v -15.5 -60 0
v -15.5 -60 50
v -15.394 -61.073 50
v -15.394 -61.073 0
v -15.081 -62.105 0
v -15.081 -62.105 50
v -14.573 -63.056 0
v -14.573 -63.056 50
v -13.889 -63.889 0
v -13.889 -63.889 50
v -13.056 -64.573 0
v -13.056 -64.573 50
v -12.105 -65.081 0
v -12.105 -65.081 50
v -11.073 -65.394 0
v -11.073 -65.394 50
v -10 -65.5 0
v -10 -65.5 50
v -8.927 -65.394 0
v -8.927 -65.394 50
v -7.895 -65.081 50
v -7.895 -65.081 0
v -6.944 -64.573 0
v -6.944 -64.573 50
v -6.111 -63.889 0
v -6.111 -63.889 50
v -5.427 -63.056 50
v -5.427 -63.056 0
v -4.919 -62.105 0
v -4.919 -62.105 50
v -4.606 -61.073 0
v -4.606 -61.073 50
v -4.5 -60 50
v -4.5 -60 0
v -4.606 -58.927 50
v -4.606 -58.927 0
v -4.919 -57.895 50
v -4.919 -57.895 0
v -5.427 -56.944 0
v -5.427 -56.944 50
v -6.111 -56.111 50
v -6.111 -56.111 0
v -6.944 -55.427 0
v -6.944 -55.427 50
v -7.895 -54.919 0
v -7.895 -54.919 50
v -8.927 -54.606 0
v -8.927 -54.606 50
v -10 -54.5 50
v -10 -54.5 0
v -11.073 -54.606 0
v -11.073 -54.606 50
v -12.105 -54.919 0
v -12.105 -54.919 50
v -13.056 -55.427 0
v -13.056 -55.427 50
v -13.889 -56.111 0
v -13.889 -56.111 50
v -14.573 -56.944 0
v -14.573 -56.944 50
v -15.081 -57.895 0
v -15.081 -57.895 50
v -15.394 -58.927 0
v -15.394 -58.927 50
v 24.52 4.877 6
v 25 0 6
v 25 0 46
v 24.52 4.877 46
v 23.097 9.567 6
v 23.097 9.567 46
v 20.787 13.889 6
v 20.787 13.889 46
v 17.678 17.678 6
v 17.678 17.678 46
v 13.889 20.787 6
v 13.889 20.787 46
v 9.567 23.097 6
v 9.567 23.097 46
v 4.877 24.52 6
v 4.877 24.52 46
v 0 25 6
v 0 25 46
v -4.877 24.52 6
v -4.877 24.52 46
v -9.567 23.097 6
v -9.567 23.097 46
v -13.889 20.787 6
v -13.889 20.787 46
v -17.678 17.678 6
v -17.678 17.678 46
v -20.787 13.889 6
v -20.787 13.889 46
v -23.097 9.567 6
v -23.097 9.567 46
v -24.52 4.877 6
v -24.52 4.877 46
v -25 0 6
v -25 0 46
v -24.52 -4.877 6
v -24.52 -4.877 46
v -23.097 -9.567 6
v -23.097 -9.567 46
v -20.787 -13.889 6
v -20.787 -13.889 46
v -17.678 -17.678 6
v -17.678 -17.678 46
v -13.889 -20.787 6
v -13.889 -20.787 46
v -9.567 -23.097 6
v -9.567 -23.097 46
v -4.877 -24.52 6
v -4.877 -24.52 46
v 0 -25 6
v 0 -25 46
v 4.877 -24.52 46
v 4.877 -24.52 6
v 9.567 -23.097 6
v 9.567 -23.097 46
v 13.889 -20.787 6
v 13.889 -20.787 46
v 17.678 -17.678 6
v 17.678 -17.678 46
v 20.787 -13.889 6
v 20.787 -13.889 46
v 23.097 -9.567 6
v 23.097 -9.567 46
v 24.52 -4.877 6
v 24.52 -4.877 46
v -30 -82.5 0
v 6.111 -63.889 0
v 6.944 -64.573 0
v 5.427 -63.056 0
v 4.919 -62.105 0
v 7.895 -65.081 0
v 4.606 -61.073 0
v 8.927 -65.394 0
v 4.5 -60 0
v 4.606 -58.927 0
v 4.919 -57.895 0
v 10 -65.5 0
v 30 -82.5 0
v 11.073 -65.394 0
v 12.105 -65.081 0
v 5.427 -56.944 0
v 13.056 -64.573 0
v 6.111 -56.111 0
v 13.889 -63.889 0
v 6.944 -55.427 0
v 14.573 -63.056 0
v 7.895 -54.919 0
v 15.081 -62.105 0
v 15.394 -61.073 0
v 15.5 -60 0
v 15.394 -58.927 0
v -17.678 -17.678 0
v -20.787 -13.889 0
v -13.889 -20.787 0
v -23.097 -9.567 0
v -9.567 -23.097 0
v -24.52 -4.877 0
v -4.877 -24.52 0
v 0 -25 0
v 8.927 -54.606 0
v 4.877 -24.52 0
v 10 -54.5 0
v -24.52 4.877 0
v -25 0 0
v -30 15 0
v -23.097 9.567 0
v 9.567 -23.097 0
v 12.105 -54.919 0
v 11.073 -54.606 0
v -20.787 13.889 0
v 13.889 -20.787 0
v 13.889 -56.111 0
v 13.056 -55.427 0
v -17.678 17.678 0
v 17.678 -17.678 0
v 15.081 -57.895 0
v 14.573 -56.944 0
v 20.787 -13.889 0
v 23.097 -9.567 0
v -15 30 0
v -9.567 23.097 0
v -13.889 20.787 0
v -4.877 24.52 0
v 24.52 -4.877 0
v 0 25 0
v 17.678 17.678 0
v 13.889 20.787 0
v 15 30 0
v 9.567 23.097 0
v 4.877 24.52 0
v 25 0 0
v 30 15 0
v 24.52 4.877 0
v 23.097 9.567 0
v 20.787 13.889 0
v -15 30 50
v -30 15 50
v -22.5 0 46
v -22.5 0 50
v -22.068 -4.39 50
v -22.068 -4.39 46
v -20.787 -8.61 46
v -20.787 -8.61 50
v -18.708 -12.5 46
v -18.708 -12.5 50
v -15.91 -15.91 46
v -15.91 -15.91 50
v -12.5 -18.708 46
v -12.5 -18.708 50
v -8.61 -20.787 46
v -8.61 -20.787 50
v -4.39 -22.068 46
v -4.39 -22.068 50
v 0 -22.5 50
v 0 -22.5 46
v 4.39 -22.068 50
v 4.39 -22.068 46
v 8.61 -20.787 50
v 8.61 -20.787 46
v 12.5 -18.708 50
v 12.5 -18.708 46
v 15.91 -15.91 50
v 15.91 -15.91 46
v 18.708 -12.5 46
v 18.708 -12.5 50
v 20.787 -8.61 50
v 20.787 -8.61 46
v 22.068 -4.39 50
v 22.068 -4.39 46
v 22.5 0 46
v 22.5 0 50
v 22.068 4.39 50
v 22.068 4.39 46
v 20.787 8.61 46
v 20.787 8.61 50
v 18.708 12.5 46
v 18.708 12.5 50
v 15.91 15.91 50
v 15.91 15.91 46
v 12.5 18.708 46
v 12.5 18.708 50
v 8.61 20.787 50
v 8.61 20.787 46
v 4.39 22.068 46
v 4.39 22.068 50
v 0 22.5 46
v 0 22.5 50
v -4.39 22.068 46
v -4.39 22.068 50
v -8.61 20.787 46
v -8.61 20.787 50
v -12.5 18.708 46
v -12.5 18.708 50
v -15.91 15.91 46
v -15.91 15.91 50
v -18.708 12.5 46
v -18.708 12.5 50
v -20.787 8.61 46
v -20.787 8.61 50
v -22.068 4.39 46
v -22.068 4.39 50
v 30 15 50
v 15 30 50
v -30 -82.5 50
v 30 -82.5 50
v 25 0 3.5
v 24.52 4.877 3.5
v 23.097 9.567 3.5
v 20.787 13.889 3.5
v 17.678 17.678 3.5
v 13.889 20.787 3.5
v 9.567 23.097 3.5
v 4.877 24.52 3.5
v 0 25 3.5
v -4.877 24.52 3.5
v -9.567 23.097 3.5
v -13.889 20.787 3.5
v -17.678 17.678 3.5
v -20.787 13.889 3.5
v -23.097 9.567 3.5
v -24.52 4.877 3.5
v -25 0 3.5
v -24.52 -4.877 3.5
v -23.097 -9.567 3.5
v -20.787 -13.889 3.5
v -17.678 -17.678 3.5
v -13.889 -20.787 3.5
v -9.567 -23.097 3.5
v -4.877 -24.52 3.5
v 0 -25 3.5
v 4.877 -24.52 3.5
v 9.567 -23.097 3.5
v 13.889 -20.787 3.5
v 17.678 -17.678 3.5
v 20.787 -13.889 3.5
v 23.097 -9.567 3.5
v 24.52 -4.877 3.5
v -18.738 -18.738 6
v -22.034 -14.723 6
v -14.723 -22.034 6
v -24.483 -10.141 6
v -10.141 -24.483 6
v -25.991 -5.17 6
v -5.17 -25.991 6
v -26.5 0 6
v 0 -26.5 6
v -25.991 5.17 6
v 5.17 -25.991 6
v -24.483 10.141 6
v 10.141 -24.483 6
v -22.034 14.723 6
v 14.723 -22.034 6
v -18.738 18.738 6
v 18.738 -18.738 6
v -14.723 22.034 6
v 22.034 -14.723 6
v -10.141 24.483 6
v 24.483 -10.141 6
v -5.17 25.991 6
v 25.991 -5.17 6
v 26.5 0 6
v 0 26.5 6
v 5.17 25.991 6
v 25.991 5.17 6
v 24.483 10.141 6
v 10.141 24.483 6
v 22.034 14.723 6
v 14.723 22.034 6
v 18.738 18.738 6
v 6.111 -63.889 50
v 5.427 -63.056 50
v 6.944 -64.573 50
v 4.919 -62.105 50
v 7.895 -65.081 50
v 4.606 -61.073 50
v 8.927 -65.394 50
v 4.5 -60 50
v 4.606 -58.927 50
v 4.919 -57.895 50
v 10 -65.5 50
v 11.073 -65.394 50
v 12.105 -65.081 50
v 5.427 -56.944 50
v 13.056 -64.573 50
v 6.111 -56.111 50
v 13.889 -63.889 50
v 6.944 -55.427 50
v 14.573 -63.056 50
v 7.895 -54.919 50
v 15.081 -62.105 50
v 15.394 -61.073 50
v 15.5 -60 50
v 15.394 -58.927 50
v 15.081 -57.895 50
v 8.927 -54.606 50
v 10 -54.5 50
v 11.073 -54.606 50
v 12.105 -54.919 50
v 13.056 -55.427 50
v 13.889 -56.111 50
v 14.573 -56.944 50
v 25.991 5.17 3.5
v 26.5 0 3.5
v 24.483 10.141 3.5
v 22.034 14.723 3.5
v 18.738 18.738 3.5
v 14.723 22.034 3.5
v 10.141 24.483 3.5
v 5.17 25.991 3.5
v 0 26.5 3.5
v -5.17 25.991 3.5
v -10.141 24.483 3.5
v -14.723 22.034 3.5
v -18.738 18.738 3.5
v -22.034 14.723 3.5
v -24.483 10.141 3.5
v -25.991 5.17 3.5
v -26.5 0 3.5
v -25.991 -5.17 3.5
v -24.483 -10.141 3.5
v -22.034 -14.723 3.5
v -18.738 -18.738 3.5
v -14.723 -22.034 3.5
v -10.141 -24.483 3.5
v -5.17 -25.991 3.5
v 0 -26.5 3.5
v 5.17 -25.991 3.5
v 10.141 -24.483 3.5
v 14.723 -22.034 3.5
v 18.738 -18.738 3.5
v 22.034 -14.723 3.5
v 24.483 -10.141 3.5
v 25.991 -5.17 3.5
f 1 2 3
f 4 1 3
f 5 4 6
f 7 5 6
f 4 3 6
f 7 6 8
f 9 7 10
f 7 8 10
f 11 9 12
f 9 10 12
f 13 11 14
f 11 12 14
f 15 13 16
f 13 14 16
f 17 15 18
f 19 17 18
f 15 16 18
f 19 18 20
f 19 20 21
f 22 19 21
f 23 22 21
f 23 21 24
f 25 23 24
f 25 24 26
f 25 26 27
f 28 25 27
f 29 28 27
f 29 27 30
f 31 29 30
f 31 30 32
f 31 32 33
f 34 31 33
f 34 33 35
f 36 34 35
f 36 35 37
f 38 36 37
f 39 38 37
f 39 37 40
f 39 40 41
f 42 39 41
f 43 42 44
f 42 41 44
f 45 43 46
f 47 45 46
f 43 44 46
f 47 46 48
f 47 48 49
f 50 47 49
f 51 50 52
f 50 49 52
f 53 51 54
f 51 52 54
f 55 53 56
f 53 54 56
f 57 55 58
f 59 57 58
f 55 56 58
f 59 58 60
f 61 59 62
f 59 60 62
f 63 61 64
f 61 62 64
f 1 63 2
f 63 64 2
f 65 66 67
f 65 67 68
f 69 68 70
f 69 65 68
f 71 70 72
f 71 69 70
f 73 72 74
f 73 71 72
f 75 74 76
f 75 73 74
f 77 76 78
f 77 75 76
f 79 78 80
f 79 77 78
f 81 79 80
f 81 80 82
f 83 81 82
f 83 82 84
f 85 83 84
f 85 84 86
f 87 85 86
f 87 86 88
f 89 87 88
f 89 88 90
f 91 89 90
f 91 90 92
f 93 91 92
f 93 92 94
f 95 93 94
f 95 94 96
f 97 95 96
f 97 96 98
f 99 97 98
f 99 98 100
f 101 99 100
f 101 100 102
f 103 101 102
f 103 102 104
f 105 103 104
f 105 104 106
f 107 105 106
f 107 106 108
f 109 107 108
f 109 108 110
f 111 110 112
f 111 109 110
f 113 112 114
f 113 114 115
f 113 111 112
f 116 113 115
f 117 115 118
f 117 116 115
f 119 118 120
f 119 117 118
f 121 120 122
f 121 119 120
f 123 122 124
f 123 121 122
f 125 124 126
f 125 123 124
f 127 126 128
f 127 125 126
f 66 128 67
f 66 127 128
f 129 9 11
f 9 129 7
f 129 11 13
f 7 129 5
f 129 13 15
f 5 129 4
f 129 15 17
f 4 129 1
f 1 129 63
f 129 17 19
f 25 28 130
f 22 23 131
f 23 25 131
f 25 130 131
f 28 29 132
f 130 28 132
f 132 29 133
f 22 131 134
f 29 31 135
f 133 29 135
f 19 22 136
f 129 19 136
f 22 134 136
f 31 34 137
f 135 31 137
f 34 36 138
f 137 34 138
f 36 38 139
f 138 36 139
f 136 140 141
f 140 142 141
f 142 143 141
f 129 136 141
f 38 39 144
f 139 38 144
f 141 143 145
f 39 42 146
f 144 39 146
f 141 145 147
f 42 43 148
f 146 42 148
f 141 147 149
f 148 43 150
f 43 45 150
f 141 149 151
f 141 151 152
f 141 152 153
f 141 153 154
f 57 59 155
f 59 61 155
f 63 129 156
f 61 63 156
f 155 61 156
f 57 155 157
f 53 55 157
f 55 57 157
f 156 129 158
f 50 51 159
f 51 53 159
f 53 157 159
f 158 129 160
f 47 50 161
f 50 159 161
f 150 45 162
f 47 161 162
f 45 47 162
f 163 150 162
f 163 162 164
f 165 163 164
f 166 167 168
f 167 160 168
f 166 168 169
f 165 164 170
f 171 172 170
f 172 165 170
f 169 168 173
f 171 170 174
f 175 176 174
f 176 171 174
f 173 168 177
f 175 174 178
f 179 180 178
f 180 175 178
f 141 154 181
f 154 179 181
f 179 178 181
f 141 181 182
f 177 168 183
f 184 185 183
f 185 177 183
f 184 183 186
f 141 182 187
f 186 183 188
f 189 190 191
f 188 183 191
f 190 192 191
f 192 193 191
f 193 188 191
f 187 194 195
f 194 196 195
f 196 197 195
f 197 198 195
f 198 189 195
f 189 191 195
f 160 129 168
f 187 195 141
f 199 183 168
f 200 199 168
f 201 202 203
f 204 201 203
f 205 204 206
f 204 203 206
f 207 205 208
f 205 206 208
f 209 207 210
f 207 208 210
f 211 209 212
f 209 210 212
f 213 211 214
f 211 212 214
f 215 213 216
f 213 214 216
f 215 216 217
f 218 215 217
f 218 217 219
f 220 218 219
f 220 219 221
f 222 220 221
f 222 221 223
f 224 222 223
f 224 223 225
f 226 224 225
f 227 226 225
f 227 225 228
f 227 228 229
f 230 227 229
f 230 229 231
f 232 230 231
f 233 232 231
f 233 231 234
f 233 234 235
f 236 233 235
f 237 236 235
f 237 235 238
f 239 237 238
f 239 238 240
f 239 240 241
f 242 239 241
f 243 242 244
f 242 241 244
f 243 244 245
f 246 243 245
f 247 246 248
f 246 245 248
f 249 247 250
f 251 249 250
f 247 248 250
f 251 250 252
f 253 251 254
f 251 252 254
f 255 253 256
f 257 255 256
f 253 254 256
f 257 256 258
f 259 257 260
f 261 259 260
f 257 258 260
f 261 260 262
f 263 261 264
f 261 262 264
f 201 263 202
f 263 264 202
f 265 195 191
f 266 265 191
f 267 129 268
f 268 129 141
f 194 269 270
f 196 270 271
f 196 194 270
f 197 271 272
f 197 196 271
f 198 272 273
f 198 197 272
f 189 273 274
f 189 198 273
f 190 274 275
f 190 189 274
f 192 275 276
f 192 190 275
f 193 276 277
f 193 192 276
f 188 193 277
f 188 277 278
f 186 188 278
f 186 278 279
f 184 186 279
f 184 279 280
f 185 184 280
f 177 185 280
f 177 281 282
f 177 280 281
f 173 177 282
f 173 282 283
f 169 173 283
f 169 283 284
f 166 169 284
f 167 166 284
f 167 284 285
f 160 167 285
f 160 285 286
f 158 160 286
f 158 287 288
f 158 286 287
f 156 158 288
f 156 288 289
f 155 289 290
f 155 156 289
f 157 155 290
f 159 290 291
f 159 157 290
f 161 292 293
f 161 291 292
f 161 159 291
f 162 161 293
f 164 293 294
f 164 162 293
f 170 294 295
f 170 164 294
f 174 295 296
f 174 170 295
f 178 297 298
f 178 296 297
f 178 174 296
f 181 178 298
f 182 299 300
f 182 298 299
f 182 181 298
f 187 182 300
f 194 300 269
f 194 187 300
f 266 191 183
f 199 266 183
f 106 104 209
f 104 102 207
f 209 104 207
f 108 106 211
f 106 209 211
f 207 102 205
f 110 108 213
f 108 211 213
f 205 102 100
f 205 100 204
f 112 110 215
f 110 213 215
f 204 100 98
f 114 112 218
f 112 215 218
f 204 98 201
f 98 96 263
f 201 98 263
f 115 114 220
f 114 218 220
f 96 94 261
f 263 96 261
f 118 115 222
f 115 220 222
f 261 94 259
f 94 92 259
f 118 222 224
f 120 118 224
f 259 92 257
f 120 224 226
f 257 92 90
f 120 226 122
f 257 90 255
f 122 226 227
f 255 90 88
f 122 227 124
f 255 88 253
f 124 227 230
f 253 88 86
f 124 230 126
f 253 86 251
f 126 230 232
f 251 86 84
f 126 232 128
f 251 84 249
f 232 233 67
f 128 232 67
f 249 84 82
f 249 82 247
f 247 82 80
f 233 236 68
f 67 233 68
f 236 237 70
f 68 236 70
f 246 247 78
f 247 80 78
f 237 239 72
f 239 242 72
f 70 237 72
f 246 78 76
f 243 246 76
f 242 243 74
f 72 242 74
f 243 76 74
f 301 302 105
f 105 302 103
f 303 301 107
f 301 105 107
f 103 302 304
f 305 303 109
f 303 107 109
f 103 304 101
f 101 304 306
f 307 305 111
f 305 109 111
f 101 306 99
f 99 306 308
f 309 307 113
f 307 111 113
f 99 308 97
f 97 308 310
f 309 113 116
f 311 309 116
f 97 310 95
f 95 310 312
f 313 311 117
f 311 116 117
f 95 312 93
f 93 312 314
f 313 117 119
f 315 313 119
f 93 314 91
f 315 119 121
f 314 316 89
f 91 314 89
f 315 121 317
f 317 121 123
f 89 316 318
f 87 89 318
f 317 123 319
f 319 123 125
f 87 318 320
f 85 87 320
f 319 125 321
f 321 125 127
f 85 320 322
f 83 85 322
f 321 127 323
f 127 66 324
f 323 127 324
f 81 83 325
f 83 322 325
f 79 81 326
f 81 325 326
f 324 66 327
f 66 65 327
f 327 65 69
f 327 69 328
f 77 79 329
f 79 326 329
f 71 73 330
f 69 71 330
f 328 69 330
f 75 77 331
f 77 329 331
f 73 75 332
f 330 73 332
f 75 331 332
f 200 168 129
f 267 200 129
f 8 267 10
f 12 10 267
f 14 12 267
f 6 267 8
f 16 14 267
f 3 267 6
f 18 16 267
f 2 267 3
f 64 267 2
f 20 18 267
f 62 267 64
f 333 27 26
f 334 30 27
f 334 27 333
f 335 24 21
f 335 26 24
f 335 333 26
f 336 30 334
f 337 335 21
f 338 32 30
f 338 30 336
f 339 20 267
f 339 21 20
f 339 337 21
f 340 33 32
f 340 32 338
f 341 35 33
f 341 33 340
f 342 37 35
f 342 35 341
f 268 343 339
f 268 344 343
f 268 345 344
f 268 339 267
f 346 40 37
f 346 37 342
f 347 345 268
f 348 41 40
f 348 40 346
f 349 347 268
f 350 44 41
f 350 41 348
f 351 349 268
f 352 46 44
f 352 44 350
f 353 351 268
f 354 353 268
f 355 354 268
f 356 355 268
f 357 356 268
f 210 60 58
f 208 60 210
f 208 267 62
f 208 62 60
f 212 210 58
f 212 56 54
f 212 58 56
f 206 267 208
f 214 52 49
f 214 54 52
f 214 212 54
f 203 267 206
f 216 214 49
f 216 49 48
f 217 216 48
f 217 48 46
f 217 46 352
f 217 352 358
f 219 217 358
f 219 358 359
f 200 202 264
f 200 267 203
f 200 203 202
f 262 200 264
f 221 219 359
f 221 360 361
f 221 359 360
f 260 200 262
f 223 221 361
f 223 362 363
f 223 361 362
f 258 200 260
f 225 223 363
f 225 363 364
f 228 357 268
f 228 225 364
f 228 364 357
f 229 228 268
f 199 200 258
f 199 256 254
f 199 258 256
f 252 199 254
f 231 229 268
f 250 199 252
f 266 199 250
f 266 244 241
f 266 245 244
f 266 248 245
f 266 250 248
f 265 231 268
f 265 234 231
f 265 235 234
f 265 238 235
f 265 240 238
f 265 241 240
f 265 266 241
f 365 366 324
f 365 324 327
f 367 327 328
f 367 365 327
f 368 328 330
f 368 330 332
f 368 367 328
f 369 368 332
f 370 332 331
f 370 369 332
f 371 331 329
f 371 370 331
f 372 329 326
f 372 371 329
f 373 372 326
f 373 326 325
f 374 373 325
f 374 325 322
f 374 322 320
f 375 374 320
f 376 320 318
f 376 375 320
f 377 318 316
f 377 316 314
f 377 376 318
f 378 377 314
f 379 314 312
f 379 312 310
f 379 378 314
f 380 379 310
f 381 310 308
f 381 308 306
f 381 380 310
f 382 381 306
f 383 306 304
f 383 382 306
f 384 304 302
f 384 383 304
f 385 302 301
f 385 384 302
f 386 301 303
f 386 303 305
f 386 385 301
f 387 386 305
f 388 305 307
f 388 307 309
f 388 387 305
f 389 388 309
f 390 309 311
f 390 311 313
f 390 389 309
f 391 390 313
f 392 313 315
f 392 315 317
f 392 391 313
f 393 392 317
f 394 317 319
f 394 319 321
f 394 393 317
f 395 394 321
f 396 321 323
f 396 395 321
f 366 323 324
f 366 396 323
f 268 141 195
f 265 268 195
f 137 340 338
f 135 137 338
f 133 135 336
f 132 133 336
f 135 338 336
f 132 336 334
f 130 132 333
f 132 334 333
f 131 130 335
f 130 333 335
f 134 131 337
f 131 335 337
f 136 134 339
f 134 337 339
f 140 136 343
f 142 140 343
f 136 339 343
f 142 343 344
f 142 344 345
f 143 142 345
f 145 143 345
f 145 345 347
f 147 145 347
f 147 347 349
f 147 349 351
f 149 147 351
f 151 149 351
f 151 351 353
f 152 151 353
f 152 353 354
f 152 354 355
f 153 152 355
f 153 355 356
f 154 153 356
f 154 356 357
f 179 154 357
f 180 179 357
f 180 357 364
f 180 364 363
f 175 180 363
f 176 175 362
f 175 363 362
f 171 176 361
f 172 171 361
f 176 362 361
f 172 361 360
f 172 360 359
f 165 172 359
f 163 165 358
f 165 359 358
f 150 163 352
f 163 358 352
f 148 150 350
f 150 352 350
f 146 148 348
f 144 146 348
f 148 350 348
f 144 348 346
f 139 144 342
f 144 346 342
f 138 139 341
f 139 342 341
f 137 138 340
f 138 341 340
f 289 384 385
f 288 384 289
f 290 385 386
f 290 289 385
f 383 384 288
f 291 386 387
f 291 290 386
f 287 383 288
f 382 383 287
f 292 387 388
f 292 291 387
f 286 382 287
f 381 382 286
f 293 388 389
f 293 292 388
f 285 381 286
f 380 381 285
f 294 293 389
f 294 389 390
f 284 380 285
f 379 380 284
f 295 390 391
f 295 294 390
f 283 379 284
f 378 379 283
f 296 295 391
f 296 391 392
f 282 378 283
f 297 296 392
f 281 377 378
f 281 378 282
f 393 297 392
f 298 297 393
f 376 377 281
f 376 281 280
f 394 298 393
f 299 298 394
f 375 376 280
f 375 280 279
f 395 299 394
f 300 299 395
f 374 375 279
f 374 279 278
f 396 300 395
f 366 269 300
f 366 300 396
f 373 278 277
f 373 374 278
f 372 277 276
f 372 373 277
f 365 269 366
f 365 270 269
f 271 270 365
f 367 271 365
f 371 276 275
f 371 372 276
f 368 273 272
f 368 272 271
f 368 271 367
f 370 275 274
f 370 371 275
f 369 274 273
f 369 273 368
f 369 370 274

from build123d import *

# Parameters (mm, degrees)
F1_DEPTH = 50
F2_D     = 11
F3_D     = 45
F4_R     = 25
F5_DEPTH = 46
F7_START = 3.5
F6_R     = 26.5
F7_DEPTH = 2.5


with BuildPart() as f1:
    # F0 (on Top) → F1 (new body)
    with BuildSketch(Plane.XY):
        Polygon((15, 30), (-15, 30), (-30, 15), (-30, -82.5), (30, -82.5), (30, 15), align=None)
    extrude(amount=F1_DEPTH)

    # F2 (through all)
    with Locations(Plane(origin=(0, 0, 0), x_dir=(1, 0, 0), z_dir=(0, 0, -1))):
        with Locations((-10, 60), (10, 60)):
            Hole(F2_D / 2)

    # F3 (through all)
    with Locations(Plane(origin=(0, 0, 0), x_dir=(1, 0, 0), z_dir=(0, 0, -1))):
        with Locations((0, 0)):
            Hole(F3_D / 2)

    # F4 (on Top) → F5 (cut)
    with BuildSketch(Plane.XY):
        Circle(F4_R)
    extrude(amount=F5_DEPTH, mode=Mode.SUBTRACT)

    # F6 (on Top) → F7 (cut)
    with BuildSketch(Plane.XY.offset(F7_START)):
        Circle(F6_R)
    extrude(amount=F7_DEPTH, mode=Mode.SUBTRACT)


solid = f1.part
